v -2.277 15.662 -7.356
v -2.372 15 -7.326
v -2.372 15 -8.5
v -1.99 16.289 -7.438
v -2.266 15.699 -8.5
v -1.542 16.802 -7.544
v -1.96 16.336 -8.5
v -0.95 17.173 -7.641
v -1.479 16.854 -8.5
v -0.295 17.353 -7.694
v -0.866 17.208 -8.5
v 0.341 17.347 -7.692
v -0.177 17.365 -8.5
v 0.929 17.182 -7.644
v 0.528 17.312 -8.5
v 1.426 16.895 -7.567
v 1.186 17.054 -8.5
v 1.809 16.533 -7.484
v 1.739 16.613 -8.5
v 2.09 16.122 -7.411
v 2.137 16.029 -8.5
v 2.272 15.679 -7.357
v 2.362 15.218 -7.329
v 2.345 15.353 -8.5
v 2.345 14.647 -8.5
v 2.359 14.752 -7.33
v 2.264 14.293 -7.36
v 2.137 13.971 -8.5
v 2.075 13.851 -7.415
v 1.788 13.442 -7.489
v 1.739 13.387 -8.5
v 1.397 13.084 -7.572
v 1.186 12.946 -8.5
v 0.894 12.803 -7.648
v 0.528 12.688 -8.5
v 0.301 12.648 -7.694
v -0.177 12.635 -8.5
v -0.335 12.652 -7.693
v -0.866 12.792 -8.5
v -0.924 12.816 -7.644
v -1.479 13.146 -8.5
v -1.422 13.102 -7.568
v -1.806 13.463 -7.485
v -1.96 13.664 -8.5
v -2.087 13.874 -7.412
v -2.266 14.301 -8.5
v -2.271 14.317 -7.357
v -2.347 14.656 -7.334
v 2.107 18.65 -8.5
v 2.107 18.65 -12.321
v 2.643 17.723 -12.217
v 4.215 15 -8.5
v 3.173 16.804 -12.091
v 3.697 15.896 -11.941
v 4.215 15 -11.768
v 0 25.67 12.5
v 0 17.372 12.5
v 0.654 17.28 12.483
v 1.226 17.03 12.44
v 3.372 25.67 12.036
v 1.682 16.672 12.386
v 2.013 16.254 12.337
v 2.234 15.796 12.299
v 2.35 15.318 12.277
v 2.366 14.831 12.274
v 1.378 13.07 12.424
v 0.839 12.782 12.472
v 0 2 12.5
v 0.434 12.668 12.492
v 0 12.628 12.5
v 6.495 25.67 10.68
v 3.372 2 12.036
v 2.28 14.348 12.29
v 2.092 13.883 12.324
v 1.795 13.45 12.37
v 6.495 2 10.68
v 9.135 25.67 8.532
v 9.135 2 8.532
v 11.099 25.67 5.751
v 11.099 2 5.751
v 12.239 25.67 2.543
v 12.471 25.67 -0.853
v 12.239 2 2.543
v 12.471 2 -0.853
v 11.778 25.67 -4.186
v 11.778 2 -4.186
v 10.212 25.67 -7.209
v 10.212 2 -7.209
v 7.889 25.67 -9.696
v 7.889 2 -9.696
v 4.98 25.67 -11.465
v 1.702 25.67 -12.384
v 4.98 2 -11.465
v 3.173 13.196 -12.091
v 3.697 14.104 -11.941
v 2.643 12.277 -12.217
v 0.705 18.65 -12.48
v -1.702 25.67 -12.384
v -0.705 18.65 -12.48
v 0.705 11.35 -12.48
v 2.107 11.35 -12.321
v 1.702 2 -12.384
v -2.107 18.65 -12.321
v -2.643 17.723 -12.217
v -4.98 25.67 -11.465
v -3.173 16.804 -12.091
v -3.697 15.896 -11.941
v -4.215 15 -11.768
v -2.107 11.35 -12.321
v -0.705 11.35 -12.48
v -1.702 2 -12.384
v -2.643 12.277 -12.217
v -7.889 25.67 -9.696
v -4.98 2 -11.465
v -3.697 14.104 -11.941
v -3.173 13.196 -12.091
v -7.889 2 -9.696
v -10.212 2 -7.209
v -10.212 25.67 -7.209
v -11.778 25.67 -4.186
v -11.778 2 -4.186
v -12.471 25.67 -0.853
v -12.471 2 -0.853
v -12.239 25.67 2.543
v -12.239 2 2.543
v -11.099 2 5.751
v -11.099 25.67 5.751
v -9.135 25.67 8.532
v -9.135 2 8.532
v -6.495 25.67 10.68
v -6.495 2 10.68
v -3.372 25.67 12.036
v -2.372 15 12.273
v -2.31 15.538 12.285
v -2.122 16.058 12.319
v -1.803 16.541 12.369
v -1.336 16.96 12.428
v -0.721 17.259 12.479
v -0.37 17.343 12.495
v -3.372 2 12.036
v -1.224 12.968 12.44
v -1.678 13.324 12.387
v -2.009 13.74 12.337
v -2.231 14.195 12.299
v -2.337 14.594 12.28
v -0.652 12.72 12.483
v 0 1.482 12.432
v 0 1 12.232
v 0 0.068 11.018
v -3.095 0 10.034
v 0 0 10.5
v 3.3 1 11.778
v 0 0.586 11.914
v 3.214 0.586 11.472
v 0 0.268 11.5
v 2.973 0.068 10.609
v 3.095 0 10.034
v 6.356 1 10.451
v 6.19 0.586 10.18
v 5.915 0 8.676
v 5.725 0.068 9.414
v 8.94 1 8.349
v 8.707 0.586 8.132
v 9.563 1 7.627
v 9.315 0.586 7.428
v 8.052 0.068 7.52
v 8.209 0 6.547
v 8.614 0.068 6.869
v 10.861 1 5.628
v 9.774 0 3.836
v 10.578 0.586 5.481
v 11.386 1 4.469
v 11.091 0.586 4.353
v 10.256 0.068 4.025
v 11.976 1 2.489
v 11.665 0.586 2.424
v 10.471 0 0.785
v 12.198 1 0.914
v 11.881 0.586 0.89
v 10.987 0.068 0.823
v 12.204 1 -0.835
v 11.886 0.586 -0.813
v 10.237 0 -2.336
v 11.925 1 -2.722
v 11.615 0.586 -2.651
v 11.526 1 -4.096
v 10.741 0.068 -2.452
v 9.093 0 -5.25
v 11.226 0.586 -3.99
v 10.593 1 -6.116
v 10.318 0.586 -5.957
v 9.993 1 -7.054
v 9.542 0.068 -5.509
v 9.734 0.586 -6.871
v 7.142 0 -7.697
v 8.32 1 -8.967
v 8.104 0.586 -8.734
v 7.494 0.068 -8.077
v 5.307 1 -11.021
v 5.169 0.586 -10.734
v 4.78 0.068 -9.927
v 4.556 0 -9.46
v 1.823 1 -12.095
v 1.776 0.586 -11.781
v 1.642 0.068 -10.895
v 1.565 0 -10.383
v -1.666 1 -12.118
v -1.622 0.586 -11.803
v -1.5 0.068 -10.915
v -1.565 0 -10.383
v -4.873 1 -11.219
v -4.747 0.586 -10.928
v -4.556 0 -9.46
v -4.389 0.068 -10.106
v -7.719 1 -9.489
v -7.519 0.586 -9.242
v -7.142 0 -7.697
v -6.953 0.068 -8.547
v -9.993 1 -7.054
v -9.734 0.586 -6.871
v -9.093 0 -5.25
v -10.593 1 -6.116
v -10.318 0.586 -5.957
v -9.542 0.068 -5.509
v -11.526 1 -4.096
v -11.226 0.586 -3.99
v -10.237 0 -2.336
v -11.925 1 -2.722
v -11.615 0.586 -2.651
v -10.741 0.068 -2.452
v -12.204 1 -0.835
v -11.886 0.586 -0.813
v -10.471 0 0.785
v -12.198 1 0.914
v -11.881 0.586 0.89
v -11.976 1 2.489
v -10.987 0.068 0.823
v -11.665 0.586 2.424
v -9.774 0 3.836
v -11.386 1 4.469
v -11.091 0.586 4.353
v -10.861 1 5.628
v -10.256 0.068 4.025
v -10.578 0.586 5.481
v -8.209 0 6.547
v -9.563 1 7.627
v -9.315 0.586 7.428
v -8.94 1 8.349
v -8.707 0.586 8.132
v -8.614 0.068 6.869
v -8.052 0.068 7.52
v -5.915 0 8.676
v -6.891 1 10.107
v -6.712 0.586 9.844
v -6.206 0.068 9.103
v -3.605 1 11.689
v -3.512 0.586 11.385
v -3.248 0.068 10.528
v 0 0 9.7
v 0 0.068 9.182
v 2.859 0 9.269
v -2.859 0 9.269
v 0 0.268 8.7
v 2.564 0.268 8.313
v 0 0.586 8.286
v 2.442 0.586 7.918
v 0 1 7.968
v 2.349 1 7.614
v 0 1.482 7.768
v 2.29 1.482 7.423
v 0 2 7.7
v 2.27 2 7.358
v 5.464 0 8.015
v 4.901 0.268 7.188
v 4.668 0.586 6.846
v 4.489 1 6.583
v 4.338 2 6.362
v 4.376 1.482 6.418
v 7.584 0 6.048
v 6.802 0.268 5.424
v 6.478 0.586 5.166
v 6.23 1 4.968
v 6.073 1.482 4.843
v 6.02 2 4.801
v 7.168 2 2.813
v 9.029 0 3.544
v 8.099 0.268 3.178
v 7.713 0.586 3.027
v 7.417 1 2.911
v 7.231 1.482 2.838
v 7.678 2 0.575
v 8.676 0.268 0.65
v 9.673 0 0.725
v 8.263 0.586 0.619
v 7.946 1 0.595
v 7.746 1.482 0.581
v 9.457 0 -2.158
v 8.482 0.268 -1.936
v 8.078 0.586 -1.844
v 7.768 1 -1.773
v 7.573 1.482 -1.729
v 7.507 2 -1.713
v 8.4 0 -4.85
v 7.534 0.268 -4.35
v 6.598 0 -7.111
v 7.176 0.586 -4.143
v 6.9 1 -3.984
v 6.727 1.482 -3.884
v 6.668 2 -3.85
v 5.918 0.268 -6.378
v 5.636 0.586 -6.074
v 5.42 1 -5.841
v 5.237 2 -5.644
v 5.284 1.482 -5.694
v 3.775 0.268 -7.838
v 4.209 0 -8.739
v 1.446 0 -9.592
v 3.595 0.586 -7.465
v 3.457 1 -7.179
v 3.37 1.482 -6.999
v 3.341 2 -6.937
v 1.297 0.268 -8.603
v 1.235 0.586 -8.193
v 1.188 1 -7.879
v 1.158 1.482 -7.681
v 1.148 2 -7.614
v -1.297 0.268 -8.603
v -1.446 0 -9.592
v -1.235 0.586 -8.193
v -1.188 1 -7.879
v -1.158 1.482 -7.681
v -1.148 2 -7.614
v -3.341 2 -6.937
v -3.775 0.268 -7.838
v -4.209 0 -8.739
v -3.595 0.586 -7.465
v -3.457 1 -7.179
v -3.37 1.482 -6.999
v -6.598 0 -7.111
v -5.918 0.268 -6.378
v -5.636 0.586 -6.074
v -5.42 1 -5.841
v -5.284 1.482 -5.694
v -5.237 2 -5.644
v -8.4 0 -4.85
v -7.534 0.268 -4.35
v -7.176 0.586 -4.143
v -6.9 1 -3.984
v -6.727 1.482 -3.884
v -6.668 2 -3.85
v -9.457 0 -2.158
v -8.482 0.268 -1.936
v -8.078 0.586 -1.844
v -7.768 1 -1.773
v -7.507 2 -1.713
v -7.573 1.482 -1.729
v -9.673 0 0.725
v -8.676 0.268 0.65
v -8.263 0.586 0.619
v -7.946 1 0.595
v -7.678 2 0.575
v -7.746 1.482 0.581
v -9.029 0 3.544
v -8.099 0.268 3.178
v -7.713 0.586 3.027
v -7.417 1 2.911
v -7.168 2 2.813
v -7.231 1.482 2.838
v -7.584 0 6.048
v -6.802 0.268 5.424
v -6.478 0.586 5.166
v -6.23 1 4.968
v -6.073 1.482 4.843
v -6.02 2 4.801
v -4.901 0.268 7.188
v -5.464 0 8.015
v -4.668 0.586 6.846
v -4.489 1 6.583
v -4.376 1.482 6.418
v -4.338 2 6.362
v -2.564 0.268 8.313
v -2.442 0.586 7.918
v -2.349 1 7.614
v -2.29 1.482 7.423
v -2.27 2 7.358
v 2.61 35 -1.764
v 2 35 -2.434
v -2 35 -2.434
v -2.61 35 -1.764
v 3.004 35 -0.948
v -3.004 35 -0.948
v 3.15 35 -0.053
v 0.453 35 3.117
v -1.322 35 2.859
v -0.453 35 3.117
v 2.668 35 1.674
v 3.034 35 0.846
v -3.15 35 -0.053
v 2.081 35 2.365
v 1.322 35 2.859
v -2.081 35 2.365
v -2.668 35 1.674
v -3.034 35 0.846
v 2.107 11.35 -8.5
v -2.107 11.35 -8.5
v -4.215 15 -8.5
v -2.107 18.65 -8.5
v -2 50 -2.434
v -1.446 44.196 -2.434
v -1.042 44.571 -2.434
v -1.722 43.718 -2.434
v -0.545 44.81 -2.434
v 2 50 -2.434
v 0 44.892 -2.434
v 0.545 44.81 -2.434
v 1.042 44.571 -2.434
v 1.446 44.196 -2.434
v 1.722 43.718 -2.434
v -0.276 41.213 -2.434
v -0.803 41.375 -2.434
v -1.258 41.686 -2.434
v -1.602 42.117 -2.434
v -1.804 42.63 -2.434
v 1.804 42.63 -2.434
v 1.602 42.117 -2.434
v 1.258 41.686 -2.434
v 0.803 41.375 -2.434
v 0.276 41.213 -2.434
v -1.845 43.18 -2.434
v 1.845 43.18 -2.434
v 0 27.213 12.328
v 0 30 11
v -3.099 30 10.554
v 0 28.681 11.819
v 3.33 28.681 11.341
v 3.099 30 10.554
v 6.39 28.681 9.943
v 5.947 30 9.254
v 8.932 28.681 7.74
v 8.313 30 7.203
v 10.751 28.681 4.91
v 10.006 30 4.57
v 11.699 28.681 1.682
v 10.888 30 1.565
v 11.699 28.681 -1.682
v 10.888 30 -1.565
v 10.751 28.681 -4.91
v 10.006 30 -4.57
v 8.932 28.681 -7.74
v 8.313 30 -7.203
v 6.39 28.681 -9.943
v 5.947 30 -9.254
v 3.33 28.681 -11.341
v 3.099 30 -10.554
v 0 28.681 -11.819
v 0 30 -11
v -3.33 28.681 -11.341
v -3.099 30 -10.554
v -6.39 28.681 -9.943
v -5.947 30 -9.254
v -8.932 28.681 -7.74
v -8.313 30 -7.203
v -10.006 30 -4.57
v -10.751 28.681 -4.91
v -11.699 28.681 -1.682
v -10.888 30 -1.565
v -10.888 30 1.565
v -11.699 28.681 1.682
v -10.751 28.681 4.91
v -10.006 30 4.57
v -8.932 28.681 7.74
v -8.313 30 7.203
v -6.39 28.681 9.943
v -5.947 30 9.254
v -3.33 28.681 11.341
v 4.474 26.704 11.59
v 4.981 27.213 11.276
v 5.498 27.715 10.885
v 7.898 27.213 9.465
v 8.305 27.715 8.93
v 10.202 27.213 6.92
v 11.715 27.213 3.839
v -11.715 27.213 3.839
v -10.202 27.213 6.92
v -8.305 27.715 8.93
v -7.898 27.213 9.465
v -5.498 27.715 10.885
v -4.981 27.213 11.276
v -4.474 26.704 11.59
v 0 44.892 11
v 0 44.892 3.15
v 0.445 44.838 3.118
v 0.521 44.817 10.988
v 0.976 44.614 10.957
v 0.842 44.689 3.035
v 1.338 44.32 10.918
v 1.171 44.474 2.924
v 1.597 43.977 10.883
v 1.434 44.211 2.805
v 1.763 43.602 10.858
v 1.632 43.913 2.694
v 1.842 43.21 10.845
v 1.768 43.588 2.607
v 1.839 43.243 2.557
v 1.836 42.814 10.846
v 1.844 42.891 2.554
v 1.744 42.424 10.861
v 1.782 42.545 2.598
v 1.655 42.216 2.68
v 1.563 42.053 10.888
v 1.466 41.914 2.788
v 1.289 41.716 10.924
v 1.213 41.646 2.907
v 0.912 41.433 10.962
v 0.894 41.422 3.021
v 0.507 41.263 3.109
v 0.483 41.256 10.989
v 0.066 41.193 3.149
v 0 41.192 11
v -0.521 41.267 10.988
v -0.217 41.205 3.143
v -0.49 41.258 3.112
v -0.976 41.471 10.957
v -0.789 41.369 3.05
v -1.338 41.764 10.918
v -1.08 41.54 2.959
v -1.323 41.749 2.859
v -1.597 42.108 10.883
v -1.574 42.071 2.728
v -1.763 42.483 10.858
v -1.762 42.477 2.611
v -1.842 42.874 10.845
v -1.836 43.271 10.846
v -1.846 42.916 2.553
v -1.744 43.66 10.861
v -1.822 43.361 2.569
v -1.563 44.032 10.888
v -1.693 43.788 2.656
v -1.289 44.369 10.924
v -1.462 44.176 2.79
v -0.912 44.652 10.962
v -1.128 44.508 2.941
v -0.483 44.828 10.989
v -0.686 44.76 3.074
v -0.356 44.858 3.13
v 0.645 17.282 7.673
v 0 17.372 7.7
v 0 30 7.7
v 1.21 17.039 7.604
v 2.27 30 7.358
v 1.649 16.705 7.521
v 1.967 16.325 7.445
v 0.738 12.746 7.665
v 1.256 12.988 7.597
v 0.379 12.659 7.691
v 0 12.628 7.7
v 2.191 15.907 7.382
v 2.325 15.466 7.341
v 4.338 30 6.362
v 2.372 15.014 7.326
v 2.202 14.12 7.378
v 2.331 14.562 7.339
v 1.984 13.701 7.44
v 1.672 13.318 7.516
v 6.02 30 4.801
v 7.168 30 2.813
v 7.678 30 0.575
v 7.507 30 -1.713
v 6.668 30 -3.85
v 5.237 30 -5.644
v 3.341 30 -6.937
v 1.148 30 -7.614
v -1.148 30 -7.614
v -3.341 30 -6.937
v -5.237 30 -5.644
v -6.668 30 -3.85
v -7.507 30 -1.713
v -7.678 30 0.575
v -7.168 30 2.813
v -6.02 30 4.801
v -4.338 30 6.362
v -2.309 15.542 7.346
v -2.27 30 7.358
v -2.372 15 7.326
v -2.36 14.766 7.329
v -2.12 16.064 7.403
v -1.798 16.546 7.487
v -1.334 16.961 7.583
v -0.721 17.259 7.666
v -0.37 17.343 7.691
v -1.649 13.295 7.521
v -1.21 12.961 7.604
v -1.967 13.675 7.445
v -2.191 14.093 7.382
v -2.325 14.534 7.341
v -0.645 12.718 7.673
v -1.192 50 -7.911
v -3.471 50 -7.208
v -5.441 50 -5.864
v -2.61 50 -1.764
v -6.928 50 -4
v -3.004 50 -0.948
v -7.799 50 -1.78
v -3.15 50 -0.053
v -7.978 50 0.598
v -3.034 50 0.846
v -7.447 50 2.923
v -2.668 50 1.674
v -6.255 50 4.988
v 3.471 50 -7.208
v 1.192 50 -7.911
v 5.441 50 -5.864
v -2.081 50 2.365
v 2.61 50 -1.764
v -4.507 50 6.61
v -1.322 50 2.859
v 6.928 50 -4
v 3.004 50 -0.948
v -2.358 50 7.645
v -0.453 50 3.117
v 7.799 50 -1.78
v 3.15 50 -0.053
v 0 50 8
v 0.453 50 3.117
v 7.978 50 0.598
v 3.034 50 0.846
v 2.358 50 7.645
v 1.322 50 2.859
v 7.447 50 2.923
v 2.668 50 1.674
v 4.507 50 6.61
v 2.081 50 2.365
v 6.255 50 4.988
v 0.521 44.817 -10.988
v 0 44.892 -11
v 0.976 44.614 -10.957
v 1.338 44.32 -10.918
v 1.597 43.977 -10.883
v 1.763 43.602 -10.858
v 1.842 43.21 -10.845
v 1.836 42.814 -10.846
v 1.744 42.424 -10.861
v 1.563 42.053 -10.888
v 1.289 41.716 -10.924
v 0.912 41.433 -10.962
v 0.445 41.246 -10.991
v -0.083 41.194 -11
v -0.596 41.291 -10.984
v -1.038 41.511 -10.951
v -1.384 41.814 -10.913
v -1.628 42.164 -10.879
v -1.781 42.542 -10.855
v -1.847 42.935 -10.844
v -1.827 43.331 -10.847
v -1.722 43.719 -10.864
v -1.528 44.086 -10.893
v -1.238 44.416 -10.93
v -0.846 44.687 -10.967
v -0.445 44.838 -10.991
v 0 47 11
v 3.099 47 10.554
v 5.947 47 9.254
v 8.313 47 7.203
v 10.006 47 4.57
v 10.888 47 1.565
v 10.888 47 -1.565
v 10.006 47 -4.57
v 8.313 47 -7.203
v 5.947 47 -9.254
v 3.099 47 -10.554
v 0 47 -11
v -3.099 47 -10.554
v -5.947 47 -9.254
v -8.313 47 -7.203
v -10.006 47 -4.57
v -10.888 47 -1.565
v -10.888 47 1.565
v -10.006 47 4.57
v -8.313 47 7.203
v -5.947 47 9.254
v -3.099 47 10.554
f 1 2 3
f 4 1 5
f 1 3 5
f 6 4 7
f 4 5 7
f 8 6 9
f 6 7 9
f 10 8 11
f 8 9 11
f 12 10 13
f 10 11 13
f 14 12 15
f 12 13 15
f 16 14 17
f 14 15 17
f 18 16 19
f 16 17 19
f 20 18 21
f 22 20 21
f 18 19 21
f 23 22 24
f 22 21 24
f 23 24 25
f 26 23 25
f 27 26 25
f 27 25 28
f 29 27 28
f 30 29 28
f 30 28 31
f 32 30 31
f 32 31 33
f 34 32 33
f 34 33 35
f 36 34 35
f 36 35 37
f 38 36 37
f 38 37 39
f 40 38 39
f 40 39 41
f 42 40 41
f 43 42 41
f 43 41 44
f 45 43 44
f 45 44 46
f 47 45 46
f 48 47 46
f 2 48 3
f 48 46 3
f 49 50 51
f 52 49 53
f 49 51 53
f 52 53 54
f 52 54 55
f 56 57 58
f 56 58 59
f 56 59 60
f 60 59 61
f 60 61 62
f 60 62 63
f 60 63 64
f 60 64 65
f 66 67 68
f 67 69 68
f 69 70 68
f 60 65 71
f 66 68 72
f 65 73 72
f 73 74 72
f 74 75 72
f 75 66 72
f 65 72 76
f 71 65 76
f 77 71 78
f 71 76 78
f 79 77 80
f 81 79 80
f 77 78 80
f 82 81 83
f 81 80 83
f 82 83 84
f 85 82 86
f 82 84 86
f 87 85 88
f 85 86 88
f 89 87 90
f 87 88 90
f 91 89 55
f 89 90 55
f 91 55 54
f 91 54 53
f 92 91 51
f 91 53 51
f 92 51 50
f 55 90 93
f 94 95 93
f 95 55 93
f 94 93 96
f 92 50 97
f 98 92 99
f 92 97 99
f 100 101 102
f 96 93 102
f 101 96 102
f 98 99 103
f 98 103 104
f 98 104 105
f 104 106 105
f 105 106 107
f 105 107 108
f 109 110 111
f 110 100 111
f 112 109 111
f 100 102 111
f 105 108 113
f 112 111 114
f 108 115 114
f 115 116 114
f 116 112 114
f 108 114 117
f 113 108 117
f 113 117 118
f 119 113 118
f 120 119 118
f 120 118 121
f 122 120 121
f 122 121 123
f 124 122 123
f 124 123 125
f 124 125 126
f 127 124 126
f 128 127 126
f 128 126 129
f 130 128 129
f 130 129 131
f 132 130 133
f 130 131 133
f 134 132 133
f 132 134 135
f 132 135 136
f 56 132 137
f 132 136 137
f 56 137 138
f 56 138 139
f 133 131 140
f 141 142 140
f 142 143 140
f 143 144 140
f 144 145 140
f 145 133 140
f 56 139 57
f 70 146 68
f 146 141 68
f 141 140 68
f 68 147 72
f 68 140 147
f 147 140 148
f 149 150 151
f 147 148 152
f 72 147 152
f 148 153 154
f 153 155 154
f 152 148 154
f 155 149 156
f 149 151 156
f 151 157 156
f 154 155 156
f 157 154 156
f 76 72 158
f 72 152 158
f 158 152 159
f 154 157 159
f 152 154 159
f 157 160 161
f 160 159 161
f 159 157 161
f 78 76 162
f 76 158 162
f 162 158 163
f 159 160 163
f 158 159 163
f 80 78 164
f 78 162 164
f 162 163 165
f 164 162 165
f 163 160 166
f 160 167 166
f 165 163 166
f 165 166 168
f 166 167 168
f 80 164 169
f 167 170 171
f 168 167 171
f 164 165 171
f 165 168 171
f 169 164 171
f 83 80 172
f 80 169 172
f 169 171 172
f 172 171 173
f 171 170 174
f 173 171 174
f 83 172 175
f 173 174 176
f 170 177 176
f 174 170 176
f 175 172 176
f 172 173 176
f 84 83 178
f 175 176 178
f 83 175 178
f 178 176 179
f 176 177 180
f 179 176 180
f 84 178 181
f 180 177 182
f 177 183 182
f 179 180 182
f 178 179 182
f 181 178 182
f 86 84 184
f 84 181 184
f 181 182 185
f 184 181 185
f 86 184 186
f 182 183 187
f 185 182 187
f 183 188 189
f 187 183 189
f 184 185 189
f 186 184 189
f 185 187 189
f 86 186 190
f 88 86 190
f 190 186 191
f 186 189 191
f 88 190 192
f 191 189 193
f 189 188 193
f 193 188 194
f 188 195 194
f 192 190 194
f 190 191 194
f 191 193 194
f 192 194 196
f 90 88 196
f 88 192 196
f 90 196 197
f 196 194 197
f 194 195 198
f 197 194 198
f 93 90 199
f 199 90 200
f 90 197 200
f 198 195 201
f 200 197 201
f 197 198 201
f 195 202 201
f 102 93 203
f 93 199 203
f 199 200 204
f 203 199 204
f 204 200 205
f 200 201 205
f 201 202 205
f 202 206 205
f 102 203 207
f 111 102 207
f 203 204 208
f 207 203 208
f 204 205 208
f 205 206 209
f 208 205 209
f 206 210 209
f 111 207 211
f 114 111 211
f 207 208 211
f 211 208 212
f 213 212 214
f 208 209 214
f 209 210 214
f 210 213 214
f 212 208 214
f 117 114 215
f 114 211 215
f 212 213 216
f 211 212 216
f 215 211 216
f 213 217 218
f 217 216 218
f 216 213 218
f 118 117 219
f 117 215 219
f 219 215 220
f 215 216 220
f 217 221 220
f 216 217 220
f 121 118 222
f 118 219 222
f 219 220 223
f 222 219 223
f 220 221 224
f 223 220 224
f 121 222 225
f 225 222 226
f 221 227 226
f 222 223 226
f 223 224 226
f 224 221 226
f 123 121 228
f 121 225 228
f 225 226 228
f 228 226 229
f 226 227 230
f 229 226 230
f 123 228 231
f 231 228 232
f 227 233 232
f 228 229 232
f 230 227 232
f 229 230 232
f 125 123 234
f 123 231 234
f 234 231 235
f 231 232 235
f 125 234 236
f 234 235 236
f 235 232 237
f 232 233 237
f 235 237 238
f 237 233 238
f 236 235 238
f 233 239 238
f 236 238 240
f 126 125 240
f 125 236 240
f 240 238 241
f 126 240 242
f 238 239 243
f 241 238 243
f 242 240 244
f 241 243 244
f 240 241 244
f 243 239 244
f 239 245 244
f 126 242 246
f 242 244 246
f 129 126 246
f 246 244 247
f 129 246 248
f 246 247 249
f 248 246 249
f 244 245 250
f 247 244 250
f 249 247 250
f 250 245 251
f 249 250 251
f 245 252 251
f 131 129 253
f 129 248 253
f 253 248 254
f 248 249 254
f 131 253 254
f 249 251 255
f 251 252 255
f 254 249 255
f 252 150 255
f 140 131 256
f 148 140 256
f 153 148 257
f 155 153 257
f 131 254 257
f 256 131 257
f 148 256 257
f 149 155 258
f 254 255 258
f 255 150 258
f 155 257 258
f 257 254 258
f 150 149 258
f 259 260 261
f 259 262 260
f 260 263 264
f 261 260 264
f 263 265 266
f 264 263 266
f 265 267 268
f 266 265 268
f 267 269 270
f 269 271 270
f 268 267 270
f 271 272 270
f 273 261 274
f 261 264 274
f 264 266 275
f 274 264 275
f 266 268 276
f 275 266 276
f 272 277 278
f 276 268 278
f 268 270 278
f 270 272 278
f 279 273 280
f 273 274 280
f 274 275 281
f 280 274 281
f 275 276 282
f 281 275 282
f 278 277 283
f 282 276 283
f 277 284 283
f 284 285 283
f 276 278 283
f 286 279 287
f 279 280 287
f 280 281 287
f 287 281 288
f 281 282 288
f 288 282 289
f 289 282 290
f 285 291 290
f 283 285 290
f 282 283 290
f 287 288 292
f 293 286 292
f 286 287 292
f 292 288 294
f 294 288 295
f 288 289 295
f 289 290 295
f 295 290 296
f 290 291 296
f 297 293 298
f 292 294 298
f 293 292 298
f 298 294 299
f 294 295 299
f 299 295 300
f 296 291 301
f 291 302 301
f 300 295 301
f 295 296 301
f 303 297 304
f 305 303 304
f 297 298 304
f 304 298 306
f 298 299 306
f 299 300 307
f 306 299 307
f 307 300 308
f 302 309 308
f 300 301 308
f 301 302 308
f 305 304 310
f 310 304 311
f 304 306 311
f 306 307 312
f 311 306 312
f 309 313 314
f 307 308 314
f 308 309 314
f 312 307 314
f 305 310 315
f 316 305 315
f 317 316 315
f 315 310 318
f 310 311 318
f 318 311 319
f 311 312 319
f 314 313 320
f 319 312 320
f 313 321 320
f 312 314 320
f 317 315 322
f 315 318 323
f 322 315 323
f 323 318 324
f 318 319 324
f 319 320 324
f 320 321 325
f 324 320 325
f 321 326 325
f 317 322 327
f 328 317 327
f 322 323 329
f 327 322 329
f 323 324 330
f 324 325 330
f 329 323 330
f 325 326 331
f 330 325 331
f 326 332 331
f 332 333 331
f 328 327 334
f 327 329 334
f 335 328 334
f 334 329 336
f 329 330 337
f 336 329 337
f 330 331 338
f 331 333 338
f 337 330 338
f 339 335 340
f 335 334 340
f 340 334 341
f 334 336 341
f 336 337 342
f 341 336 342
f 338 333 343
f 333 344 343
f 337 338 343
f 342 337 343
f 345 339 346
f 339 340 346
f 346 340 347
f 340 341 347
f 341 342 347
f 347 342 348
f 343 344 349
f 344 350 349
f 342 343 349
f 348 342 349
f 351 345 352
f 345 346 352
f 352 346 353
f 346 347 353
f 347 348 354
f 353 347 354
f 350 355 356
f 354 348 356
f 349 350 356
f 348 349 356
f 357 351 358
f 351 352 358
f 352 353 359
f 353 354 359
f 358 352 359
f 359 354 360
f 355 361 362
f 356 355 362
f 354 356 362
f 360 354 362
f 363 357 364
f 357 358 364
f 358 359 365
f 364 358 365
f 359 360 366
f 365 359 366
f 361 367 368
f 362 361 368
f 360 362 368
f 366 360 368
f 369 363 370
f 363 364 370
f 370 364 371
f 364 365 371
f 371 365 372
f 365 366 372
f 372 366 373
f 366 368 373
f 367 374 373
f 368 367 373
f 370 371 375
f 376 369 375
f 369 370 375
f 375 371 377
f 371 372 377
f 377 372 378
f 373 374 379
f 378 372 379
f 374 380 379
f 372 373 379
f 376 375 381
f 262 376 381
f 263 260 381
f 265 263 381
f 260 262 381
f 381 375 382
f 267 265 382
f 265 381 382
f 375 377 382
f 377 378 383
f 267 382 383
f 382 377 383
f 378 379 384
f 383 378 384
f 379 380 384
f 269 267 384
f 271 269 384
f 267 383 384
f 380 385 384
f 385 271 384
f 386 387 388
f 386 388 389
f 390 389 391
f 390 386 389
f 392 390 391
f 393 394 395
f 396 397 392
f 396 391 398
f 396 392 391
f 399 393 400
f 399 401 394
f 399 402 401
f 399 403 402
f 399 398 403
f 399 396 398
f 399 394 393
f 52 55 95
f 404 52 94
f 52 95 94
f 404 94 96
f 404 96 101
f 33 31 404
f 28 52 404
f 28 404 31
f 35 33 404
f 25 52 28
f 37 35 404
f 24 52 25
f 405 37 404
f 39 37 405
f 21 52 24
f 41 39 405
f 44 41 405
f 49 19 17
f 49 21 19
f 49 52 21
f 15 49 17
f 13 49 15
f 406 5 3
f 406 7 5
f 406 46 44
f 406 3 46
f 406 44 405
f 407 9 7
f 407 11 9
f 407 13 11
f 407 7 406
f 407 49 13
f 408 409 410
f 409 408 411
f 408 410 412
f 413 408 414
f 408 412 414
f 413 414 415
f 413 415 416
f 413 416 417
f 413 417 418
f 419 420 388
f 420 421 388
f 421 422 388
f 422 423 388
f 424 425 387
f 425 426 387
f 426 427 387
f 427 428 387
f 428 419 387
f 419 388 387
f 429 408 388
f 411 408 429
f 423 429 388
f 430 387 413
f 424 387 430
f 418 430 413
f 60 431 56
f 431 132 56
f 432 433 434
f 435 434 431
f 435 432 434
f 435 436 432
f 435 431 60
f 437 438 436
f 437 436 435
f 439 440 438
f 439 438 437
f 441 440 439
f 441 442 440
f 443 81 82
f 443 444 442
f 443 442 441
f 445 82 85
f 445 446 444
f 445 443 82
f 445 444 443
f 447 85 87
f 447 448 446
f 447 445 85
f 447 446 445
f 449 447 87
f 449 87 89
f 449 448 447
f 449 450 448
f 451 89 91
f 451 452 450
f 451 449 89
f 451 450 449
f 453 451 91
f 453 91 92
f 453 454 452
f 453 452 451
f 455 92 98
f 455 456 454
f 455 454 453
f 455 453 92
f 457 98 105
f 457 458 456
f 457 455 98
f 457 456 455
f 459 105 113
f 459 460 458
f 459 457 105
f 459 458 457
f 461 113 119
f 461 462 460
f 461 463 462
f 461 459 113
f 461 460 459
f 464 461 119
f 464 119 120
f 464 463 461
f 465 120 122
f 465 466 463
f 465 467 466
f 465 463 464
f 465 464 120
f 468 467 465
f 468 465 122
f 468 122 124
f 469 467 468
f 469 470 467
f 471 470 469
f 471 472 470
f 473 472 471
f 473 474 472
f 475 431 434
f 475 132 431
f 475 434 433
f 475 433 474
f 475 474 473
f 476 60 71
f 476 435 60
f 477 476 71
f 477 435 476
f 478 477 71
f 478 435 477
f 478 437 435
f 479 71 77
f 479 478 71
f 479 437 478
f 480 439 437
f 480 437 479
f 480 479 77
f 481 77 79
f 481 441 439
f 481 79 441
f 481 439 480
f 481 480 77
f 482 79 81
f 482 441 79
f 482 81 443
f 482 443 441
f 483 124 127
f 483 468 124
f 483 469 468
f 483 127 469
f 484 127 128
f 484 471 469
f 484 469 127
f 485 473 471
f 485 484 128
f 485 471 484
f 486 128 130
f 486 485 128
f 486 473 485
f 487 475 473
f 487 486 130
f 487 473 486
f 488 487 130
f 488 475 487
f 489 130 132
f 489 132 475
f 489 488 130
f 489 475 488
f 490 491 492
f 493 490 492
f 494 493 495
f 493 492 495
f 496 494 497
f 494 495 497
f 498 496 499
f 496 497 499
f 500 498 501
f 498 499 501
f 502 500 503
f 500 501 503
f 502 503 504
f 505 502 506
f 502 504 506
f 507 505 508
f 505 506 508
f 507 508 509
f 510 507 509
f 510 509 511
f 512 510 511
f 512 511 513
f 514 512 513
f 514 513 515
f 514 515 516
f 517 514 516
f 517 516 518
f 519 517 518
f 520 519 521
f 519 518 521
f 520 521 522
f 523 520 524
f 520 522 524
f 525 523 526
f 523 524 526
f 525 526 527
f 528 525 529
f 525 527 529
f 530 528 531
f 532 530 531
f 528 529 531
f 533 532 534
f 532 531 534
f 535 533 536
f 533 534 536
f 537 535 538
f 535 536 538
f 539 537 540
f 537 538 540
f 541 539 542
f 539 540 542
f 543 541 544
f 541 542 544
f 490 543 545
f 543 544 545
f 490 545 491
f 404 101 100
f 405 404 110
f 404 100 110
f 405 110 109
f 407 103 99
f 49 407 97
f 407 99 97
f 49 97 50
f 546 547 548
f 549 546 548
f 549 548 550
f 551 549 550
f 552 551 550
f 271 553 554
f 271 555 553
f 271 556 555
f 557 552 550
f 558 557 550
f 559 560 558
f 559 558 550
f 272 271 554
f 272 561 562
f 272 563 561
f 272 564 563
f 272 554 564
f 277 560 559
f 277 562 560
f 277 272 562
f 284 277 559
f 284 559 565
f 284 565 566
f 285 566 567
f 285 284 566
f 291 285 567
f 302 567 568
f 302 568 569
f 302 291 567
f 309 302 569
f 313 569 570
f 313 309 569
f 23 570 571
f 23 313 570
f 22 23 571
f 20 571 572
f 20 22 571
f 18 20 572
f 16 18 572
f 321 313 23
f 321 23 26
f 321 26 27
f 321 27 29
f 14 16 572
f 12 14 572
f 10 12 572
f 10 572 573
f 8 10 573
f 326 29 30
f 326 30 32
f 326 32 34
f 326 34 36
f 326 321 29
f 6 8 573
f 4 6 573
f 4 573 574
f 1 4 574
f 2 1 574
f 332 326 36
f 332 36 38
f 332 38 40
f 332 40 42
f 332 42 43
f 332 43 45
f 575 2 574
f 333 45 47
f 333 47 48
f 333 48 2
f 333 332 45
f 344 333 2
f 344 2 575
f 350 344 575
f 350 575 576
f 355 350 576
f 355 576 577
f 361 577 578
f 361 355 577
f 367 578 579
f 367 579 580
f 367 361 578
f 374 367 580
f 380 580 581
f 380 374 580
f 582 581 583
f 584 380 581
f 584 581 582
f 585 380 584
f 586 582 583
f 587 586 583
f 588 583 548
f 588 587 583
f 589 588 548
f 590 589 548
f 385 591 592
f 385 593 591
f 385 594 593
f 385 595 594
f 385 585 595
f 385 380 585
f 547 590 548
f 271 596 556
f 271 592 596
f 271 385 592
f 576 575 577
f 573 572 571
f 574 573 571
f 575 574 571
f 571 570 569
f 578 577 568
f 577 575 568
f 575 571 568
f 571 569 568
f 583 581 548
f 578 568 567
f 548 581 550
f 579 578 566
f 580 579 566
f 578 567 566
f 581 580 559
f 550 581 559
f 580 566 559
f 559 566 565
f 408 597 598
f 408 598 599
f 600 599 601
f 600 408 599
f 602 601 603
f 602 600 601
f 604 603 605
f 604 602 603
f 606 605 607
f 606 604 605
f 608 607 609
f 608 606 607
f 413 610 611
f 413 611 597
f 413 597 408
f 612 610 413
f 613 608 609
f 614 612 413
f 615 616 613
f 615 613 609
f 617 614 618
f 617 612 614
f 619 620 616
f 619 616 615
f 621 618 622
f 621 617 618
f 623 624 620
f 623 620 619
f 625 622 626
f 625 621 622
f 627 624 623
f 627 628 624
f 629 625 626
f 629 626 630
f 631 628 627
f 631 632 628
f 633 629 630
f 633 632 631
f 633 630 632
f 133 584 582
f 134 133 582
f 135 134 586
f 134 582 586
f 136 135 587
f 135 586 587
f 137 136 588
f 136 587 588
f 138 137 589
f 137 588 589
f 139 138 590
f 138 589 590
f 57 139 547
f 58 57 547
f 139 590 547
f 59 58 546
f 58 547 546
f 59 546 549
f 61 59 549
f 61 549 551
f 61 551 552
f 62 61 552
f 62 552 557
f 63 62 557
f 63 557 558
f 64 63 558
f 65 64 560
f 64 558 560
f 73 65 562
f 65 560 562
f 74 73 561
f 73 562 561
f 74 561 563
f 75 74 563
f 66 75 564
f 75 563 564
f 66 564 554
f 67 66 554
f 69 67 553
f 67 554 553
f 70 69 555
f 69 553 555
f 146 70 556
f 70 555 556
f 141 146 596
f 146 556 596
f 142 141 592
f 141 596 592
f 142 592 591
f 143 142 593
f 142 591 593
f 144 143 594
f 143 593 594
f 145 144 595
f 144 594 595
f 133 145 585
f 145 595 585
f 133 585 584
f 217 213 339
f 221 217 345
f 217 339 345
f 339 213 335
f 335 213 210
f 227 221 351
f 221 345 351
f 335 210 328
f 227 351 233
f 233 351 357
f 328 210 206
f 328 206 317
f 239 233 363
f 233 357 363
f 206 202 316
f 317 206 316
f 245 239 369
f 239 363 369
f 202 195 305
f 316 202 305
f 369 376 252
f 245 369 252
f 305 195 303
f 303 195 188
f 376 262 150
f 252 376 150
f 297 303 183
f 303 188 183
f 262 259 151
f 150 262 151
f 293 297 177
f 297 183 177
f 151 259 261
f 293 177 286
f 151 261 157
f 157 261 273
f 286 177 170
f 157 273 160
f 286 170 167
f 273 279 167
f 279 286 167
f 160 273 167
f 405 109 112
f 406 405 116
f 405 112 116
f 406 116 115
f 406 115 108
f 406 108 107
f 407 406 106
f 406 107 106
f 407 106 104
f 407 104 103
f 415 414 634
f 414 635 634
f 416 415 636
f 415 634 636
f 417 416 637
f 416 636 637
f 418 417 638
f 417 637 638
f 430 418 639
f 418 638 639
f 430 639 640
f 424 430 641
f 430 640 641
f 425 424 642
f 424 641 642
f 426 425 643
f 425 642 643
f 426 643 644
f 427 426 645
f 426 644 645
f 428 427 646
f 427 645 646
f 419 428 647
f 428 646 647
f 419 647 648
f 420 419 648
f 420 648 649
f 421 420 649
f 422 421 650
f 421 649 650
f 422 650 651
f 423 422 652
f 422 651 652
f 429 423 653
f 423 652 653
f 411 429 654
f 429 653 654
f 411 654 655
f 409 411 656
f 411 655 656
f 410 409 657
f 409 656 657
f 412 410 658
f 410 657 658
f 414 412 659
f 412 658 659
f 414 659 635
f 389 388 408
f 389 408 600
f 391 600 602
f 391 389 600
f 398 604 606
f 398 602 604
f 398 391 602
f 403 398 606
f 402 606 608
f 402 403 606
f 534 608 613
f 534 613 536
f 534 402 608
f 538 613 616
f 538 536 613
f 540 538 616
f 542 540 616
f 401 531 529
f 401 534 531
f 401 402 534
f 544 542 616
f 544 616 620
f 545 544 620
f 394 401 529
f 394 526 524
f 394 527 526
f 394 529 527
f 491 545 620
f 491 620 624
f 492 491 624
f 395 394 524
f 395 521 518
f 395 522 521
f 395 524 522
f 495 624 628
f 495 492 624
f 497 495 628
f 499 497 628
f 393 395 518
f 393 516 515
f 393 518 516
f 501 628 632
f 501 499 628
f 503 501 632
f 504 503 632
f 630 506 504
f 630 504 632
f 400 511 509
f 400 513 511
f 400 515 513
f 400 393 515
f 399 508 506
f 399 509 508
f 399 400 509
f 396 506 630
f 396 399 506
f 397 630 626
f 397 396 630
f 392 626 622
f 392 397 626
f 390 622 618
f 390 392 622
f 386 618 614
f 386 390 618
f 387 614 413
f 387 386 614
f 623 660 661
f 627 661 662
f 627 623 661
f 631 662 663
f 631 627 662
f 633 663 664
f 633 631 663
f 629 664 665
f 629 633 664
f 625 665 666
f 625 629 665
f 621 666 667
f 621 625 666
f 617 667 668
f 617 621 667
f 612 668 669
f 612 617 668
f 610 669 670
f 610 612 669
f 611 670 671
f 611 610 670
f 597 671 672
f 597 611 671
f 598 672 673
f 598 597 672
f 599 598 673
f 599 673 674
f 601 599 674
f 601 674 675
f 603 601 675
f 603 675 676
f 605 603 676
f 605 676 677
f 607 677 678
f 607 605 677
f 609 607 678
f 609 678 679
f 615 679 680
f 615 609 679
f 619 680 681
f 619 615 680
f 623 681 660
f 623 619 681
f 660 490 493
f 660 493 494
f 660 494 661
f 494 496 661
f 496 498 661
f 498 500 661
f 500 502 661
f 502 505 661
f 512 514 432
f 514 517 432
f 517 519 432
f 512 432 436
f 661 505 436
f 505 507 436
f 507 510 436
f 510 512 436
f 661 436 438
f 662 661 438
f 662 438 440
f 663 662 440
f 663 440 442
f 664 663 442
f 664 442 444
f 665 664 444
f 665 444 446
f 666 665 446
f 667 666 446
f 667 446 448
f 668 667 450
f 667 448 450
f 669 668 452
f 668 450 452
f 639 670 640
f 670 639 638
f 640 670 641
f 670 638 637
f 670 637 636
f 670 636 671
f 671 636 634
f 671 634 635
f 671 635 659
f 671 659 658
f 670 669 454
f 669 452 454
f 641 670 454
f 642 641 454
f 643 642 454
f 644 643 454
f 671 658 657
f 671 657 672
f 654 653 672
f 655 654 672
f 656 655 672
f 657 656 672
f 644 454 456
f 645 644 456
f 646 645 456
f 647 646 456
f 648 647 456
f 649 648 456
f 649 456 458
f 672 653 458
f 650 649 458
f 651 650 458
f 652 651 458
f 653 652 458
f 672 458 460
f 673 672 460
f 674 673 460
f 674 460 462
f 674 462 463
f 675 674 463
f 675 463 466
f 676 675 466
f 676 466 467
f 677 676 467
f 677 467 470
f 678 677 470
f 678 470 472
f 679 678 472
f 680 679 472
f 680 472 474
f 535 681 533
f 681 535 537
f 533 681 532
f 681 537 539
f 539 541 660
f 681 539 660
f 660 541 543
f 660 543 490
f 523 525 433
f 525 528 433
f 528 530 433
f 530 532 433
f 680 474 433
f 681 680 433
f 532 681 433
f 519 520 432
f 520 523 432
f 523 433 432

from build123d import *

# Parameters (mm, degrees)
SKETCH1_R           = 11
SKETCH1_R_2         = 7.7
BOSS_EXTRUDE1_DEPTH = 30
BOSS_EXTRUDE2_START = 30
SKETCH1_2_R         = 11
SKETCH1_2_R_2       = 7.7
BOSS_EXTRUDE2_DEPTH = 5
BOSS_EXTRUDE3_START = 35
SKETCH1_4_R         = 11
SKETCH1_4_R_2       = 7.7
SKETCH1_4_R_3       = 3.15
BOSS_EXTRUDE3_DEPTH = 15
SKETCH1_5_R         = 12.5
SKETCH1_5_R_2       = 11
BOSS_EXTRUDE4_DEPTH = 30
SKETCH2_R           = 1.85
CUT_EXTRUDE1_DEPTH  = 58.282196187
SKETCH2_7_R         = 2.371596242
CUT_EXTRUDE2_DEPTH  = 4
SKETCH2_8_R         = 2.371596242
CUT_EXTRUDE3_DEPTH  = 58.282196274
FILLET1_R           = 7
FILLET2_R           = 2
CHAMFER1_SIZE       = 3


with BuildPart() as part:
    # Sketch1 → Boss-Extrude1 (new body)
    with BuildSketch(Plane(origin=(0, 0, 0), x_dir=(1, 0, 0), z_dir=(0, 1, 0))):
        with Locations(Location((0, 0, 0), (0, 0, 270))):
            Circle(SKETCH1_R)
        with Locations(Location((0, 0, 0), (0, 0, 270))):
            Circle(SKETCH1_R_2, mode=Mode.SUBTRACT)
    extrude(amount=BOSS_EXTRUDE1_DEPTH)

    # Sketch1<2> → Boss-Extrude2 (add)
    # profile 1 of 6: a face of its own
    with BuildSketch(Plane(origin=(0, 0, 0), x_dir=(1, 0, 0), z_dir=(0, 1, 0)).offset(BOSS_EXTRUDE2_START)):
        with Locations(Location((0, 0, 0), (0, 0, 270))):
            Circle(SKETCH1_2_R)
        with Locations(Location((0, 0, 0), (0, 0, 270))):
            Circle(SKETCH1_2_R_2, mode=Mode.SUBTRACT)
    # profile 2 of 6: a face of its own
    with BuildSketch(Plane(origin=(0, 0, 0), x_dir=(1, 0, 0), z_dir=(0, 1, 0)).offset(BOSS_EXTRUDE2_START)):
        with Locations(Location((0, 0, 0), (0, 0, 270))):
            Circle(SKETCH1_2_R_2)
    # profile 3 of 6: a face of its own
    with BuildSketch(Plane(origin=(0, 0, 0), x_dir=(1, 0, 0), z_dir=(0, 1, 0)).offset(BOSS_EXTRUDE2_START)):
        with BuildLine():
            ThreePointArc((2, 2.433618705), (0, 3.15), (-2, 2.433618705))
            Line((-2, 2.433618705), (2, 2.433618705))
        make_face()
    # profile 4 of 6: a face of its own
    with BuildSketch(Plane(origin=(0, 0, 0), x_dir=(1, 0, 0), z_dir=(0, 1, 0)).offset(BOSS_EXTRUDE2_START)):
        with BuildLine():
            Line((2, 2.433618705), (-2, 2.433618705))
            ThreePointArc((-2, 2.433618705), (-1.345826883, -2.848025632), (3.15, 0))
            ThreePointArc((3.15, 0), (2.848025632, 1.345826883), (2, 2.433618705))
        make_face()
    # profile 5 of 6: a face of its own
    with BuildSketch(Plane(origin=(0, 0, 0), x_dir=(1, 0, 0), z_dir=(0, 1, 0)).offset(BOSS_EXTRUDE2_START)):
        with BuildLine():
            ThreePointArc((2, 2.433618705), (0, 3.15), (-2, 2.433618705))
            Line((-2, 2.433618705), (2, 2.433618705))
        make_face()
    # profile 6 of 6: a face of its own
    with BuildSketch(Plane(origin=(0, 0, 0), x_dir=(1, 0, 0), z_dir=(0, 1, 0)).offset(BOSS_EXTRUDE2_START)):
        with BuildLine():
            Line((2, 2.433618705), (-2, 2.433618705))
            ThreePointArc((-2, 2.433618705), (-1.345826883, -2.848025632), (3.15, 0))
            ThreePointArc((3.15, 0), (2.848025632, 1.345826883), (2, 2.433618705))
        make_face()
    extrude(amount=BOSS_EXTRUDE2_DEPTH)

    # Sketch1<4> → Boss-Extrude3 (add)
    # profile 1 of 3: a face of its own
    with BuildSketch(Plane(origin=(0, 0, 0), x_dir=(1, 0, 0), z_dir=(0, 1, 0)).offset(BOSS_EXTRUDE3_START)):
        with Locations(Location((0, 0, 0), (0, 0, 270))):
            Circle(SKETCH1_4_R)
        with Locations(Location((0, 0, 0), (0, 0, 270))):
            Circle(SKETCH1_4_R_2, mode=Mode.SUBTRACT)
    # profile 2 of 3: a face of its own
    with BuildSketch(Plane(origin=(0, 0, 0), x_dir=(1, 0, 0), z_dir=(0, 1, 0)).offset(BOSS_EXTRUDE3_START)):
        with Locations(Location((0, 0, 0), (0, 0, 270))):
            Circle(SKETCH1_4_R_2)
        Circle(SKETCH1_4_R_3, mode=Mode.SUBTRACT)
    # profile 3 of 3: a face of its own
    with BuildSketch(Plane(origin=(0, 0, 0), x_dir=(1, 0, 0), z_dir=(0, 1, 0)).offset(BOSS_EXTRUDE3_START)):
        with BuildLine():
            ThreePointArc((2, 2.433618705), (0, 3.15), (-2, 2.433618705))
            Line((-2, 2.433618705), (2, 2.433618705))
        make_face()
    extrude(amount=BOSS_EXTRUDE3_DEPTH)

    # Sketch1<5> → Boss-Extrude4 (add)
    with BuildSketch(Plane(origin=(0, 0, 0), x_dir=(1, 0, 0), z_dir=(0, 1, 0))):
        with Locations(Location((0, 0, 0), (0, 0, 270))):
            Circle(SKETCH1_5_R)
        with Locations(Location((0, 0, 0), (0, 0, 270))):
            Circle(SKETCH1_5_R_2, mode=Mode.SUBTRACT)
    extrude(amount=BOSS_EXTRUDE4_DEPTH)

    # Sketch2 → Cut-Extrude1 (cut, through all)
    with BuildSketch(Plane(origin=(0, 0, -12.5), x_dir=(-1, 0, 0), z_dir=(0, 0, -1))):
        with Locations(Location((0, 43.042161893, 0), (0, 0, 90))):
            Circle(SKETCH2_R)
    extrude(amount=-CUT_EXTRUDE1_DEPTH, mode=Mode.SUBTRACT)

    # Sketch2<7> → Cut-Extrude2 (cut)
    # profile 1 of 2: a face of its own
    with BuildSketch(Plane(origin=(0, 0, -12.5), x_dir=(-1, 0, 0), z_dir=(0, 0, -1))):
        Polygon((-2.107328483, 11.35), (2.107328483, 11.35), (4.214656965, 15), (2.107328483, 18.65), (-2.107328483, 18.65), (-4.214656965, 15), align=None)
        with Locations((0, 15)):
            Circle(SKETCH2_7_R, mode=Mode.SUBTRACT)
    # profile 2 of 2: a face of its own
    with BuildSketch(Plane(origin=(0, 0, -12.5), x_dir=(-1, 0, 0), z_dir=(0, 0, -1))):
        with Locations((0, 15)):
            Circle(SKETCH2_7_R)
    extrude(amount=-CUT_EXTRUDE2_DEPTH, mode=Mode.SUBTRACT)

    # Sketch2<8> → Cut-Extrude3 (cut, through all)
    with BuildSketch(Plane(origin=(0, 0, -12.5), x_dir=(-1, 0, 0), z_dir=(0, 0, -1))):
        with Locations((0, 15)):
            Circle(SKETCH2_8_R)
    extrude(amount=-CUT_EXTRUDE3_DEPTH, mode=Mode.SUBTRACT)

    # Fillet1
    # the kernel refuses this fillet: 7 mm, written as the material it takes off along each edge
    with BuildSketch(Plane(origin=(0, 30, 0), x_dir=(0, 0, 1), z_dir=(-1, 0, 0))) as fillet1_piece_1:
        with BuildLine():
            CenterArc((5.5, -4.330127019), FILLET1_R, 0, 38.213210702)
            Line((12.5, -4.330127019), (12.64, -4.330127019))
            Line((12.64, -4.330127019), (12.64, 0))
            Line((12.64, 0), (12.5, 0.14))
            ThreePointArc((12.5, 0.14), (11.75, 0.14), (11.11, 0.08660254))
            Line((11.11, 0.08660254), (11, 0))
        make_face()
    revolve(axis=Axis((0, 30, 0), (0, 1, 0)), mode=Mode.SUBTRACT)

    # Fillet2
    fillet2_edges = [part.edges().sort_by_distance(p)[0] for p in [
        (0, 0, -12.5),
        (0, 0, -7.7),
    ]]
    fillet(fillet2_edges, radius=FILLET2_R)

    # Chamfer1
    chamfer1_edges = [part.edges().sort_by_distance(p)[0] for p in [
        (0, 50, -11),
    ]]
    chamfer(chamfer1_edges, length=CHAMFER1_SIZE)


solid = part.part
